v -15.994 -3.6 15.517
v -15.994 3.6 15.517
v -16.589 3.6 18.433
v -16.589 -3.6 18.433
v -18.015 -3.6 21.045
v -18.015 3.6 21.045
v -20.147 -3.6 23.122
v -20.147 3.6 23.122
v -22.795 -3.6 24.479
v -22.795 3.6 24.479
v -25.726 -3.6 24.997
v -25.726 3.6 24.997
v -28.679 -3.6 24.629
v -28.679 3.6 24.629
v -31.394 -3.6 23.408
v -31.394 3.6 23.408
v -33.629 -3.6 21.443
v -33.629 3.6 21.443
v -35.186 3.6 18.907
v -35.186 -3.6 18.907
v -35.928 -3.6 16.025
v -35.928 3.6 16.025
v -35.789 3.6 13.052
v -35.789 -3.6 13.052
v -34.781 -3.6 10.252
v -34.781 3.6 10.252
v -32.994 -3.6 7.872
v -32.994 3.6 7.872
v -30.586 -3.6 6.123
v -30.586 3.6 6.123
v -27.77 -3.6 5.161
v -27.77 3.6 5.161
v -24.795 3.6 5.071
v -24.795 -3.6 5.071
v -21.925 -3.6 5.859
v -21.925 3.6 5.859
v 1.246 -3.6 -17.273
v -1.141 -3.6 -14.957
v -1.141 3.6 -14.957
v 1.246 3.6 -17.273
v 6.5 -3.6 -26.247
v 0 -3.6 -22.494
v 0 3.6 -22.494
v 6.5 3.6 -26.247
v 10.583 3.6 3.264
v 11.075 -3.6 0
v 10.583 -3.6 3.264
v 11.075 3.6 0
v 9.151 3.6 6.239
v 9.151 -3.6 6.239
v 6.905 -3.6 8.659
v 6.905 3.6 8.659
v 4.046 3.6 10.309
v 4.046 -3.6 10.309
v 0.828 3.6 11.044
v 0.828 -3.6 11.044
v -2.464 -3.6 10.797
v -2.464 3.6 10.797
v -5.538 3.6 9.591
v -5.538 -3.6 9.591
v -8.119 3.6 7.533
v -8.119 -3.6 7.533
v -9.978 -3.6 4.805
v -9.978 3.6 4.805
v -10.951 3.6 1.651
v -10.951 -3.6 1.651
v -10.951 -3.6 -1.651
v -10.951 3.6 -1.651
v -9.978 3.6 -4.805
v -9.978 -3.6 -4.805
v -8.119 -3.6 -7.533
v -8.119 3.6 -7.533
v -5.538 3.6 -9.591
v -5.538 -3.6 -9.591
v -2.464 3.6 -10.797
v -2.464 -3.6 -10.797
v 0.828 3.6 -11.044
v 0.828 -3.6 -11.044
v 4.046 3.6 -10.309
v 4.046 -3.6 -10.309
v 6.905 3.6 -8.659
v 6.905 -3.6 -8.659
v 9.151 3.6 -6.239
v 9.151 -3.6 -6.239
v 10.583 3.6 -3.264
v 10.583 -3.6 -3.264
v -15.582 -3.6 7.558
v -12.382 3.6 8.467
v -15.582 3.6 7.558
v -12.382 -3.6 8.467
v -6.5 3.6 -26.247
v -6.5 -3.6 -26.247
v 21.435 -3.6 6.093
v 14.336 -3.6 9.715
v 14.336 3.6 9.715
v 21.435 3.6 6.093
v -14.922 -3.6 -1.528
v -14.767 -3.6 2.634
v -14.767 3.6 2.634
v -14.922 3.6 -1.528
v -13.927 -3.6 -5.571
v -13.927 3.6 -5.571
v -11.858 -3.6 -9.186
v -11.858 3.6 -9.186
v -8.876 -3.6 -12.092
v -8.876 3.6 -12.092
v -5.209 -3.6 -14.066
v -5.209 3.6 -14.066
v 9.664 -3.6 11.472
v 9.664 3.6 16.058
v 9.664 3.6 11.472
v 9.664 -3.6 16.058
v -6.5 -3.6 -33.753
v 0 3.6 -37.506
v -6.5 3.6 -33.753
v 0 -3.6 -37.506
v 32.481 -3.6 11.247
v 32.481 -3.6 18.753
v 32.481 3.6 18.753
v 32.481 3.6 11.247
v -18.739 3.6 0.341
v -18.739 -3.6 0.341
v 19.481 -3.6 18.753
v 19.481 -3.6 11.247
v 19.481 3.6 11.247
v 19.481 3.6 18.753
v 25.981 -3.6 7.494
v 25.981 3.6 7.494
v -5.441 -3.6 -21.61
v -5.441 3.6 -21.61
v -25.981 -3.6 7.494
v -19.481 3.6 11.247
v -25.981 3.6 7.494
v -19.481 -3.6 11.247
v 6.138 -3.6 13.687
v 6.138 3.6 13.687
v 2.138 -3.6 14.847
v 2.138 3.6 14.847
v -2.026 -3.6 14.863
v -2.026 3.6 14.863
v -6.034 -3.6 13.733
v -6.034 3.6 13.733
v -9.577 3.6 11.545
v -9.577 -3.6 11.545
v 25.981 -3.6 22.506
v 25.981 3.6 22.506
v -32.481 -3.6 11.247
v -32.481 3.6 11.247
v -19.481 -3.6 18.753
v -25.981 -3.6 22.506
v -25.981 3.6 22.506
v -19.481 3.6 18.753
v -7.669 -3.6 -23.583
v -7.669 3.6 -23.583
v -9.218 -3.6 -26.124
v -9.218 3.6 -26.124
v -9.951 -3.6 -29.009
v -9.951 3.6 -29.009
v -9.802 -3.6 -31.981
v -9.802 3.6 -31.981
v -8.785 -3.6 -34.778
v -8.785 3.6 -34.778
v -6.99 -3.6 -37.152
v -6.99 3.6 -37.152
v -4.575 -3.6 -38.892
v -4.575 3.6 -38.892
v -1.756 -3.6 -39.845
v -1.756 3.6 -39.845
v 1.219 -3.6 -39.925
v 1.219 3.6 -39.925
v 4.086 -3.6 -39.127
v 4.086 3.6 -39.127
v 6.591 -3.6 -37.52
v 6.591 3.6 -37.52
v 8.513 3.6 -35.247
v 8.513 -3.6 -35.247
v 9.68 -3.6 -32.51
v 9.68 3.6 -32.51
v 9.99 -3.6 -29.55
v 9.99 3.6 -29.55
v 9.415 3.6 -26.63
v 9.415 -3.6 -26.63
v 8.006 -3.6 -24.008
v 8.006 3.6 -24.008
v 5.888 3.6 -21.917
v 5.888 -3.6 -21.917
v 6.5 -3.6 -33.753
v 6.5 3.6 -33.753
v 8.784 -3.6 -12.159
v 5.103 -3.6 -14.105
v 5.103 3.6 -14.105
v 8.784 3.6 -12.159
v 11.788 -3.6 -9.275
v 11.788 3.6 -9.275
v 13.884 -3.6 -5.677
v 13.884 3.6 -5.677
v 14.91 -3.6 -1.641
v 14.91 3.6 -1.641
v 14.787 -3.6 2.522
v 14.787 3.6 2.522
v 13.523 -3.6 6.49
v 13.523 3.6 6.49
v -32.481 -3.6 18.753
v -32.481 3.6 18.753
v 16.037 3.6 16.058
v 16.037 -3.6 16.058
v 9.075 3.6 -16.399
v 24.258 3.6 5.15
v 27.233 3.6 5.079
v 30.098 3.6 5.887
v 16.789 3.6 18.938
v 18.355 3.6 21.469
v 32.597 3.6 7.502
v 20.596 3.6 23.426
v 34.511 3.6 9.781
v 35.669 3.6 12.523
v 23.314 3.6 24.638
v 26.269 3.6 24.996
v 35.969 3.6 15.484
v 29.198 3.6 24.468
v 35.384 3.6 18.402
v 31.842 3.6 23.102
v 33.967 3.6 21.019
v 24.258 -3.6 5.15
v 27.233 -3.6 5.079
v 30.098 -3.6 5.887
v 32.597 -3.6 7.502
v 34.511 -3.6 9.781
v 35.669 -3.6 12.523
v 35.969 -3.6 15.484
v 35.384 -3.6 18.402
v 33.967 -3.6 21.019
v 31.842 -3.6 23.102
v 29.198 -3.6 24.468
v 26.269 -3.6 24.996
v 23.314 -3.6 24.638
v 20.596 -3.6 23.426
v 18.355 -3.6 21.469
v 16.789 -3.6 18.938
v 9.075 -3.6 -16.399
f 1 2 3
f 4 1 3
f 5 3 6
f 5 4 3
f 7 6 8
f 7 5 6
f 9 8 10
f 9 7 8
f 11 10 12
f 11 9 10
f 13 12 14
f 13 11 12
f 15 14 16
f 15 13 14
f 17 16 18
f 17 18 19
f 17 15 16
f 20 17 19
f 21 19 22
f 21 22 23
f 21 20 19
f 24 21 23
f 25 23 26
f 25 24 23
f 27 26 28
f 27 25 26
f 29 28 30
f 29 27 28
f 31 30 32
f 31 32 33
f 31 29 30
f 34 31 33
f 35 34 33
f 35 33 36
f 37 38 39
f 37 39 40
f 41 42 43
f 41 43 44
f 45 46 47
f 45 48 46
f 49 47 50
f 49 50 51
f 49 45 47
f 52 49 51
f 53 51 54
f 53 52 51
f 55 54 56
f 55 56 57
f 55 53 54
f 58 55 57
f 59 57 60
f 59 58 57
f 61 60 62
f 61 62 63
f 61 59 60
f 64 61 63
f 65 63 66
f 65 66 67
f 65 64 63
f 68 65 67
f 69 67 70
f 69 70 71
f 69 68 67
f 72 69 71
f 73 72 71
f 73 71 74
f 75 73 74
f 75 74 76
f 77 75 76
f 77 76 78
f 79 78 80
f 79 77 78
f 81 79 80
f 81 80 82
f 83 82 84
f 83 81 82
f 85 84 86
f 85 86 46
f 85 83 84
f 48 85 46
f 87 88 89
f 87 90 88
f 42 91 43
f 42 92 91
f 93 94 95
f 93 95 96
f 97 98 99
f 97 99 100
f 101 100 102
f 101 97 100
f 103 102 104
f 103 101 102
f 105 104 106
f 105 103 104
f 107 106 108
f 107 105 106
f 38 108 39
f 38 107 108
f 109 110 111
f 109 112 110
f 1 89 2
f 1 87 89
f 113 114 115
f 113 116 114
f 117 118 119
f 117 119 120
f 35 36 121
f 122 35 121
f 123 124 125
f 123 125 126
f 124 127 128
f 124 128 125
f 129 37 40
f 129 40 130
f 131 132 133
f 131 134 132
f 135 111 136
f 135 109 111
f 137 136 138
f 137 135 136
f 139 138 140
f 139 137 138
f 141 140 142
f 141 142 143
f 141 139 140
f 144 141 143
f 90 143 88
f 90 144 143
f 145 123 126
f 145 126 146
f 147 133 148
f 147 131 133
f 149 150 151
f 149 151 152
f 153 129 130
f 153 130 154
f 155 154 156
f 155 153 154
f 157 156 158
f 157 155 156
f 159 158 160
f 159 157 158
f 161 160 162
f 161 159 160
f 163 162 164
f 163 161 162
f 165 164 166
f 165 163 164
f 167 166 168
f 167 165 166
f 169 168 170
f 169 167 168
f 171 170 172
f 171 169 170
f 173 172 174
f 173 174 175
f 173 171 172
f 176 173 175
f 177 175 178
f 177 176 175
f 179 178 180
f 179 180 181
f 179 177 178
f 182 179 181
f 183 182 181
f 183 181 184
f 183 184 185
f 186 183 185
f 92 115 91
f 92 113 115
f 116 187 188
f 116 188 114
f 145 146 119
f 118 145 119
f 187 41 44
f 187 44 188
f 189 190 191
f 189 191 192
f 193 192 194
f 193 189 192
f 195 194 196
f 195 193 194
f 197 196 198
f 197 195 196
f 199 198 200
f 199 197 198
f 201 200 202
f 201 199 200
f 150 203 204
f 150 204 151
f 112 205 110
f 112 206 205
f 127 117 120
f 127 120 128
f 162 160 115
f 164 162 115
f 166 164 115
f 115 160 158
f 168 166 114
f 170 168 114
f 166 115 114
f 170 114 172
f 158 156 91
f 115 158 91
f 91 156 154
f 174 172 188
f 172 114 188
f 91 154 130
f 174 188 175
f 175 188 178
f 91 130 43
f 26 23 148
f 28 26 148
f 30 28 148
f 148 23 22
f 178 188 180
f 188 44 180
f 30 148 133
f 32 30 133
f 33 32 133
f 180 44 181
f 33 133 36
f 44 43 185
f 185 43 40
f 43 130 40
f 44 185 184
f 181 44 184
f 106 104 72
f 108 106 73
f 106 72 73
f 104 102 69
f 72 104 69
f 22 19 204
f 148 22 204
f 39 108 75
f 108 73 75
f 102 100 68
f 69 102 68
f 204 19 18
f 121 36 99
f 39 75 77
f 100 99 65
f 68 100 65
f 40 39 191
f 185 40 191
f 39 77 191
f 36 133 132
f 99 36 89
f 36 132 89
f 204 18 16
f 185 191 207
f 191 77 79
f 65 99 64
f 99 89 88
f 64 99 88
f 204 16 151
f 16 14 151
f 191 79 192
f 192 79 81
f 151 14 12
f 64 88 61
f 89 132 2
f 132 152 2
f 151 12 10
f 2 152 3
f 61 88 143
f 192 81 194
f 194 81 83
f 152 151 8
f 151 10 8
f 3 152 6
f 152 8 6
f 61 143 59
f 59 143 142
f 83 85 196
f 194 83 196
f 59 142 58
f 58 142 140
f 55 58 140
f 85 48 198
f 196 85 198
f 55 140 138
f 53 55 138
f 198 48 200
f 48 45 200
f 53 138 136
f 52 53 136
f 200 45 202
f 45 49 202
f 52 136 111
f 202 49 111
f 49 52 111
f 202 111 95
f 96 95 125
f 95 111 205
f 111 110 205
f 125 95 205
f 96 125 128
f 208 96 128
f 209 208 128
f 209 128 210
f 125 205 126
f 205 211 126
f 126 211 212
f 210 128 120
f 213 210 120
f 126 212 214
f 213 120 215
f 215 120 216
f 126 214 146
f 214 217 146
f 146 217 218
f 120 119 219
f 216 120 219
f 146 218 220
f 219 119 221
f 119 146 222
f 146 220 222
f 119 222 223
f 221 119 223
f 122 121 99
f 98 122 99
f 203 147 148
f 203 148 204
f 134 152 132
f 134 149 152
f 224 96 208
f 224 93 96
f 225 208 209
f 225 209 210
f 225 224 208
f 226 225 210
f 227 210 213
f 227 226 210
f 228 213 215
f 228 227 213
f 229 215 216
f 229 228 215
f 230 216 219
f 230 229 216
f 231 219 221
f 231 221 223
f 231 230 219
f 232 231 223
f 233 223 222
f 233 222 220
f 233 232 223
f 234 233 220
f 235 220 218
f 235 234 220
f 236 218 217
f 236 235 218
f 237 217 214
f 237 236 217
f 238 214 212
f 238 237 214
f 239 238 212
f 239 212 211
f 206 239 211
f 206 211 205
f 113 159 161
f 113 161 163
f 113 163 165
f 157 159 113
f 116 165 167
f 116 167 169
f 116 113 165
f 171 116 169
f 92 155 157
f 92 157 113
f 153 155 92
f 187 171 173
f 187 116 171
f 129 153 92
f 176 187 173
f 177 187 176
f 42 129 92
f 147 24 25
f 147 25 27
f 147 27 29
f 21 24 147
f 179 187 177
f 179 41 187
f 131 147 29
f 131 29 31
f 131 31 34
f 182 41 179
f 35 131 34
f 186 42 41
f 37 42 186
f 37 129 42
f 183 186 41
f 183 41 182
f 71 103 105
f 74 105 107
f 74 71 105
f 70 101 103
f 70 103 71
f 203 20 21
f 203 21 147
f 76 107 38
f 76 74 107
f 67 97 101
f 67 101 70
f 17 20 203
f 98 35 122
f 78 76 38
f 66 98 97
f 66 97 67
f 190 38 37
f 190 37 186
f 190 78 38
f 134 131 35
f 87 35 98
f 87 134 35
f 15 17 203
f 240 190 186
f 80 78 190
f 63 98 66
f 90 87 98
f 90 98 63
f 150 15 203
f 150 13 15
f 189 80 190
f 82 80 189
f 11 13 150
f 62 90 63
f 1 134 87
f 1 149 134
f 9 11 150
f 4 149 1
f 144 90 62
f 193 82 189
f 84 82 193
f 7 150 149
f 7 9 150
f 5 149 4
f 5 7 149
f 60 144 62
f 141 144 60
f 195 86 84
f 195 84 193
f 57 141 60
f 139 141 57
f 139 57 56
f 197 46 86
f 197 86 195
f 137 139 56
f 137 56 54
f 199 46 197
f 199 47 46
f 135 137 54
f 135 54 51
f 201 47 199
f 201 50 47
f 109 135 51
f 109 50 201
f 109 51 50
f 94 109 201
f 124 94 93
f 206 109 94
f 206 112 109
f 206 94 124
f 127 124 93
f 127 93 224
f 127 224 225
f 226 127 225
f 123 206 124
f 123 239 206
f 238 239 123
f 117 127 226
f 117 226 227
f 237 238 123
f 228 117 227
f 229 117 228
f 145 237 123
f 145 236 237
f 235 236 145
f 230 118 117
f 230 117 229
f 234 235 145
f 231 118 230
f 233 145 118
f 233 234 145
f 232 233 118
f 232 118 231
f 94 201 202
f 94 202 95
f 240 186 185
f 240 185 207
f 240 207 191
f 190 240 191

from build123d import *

# Parameters (mm, degrees)
F0_R     = 11.075
F1_DEPTH = 3.6


# Not quite as in the source:
# - a feature of the source that left no trace in its solid (it failed there, or was rolled back) is left out


with BuildPart() as f1:
    # F0 (on Front) → F1 (new body, symmetric)
    with BuildSketch(Plane.XZ):
        with BuildLine():
            Line((-18.7389361234, 0.3405199539), (-14.7669712633, 2.6337349351))
            ThreePointArc((-14.7669712633, 2.6337349351), (-11.8584662517, -9.1856833256), (-1.1413957778, -14.9565108123))
            Line((-1.1413957778, -14.9565108123), (1.2456877462, -17.2733709451))
            Line((1.2456877462, -17.2733709451), (-5.4411288371, -21.6098797995))
            ThreePointArc((-5.4411288371, -21.6098797995), (-0.2713631395, -39.9963174243), (5.8883015494, -21.9174320378))
            Line((5.8883015494, -21.9174320378), (9.0745691311, -16.3986546997))
            Line((9.0745691311, -16.3986546997), (5.102604271, -14.1054397185))
            ThreePointArc((5.102604271, -14.1054397185), (13.8842682369, -5.6768913611), (13.5234162043, 6.4897776668))
            Line((13.5234162043, 6.4897776668), (14.3363341744, 9.7154827059))
            Line((14.3363341744, 9.7154827059), (21.4352692976, 6.0927841016))
            ThreePointArc((21.4352692976, 6.0927841016), (34.773508517, 19.7631513397), (16.0369021558, 16.0581347458))
            Line((16.0369021558, 16.0581347458), (9.6643669923, 16.0581347458))
            Line((9.6643669923, 16.0581347458), (9.6643669923, 11.4717047835))
            ThreePointArc((9.6643669923, 11.4717047835), (-2.0258019852, 14.8625746867), (-12.3820204265, 8.4667331455))
            Line((-12.3820204265, 8.4667331455), (-15.5820219205, 7.5578882392))
            Line((-15.5820219205, 7.5578882392), (-15.9941404606, 15.5170956979))
            ThreePointArc((-15.9941404606, 15.5170956979), (-34.5021453775, 20.2331660846), (-21.9252037051, 5.859297292))
            Line((-21.9252037051, 5.859297292), (-18.7389361234, 0.3405199539))
        make_face()
        Polygon((0, -22.4944465005), (6.5, -26.2472232503), (6.5, -33.7527767497), (0, -37.5055534995), (-6.5, -33.7527767497), (-6.5, -26.2472232503), align=None, mode=Mode.SUBTRACT)
        Circle(F0_R, mode=Mode.SUBTRACT)
        Polygon((-32.4807621135, 11.2472232503), (-32.4807621135, 18.7527767497), (-25.9807621135, 22.5055534995), (-19.4807621135, 18.7527767497), (-19.4807621135, 11.2472232503), (-25.9807621135, 7.4944465005), align=None, mode=Mode.SUBTRACT)
        Polygon((25.9807621135, 22.5055534995), (32.4807621135, 18.7527767497), (32.4807621135, 11.2472232503), (25.9807621135, 7.4944465005), (19.4807621135, 11.2472232503), (19.4807621135, 18.7527767497), align=None, mode=Mode.SUBTRACT)
    extrude(amount=F1_DEPTH, both=True)


solid = f1.part
